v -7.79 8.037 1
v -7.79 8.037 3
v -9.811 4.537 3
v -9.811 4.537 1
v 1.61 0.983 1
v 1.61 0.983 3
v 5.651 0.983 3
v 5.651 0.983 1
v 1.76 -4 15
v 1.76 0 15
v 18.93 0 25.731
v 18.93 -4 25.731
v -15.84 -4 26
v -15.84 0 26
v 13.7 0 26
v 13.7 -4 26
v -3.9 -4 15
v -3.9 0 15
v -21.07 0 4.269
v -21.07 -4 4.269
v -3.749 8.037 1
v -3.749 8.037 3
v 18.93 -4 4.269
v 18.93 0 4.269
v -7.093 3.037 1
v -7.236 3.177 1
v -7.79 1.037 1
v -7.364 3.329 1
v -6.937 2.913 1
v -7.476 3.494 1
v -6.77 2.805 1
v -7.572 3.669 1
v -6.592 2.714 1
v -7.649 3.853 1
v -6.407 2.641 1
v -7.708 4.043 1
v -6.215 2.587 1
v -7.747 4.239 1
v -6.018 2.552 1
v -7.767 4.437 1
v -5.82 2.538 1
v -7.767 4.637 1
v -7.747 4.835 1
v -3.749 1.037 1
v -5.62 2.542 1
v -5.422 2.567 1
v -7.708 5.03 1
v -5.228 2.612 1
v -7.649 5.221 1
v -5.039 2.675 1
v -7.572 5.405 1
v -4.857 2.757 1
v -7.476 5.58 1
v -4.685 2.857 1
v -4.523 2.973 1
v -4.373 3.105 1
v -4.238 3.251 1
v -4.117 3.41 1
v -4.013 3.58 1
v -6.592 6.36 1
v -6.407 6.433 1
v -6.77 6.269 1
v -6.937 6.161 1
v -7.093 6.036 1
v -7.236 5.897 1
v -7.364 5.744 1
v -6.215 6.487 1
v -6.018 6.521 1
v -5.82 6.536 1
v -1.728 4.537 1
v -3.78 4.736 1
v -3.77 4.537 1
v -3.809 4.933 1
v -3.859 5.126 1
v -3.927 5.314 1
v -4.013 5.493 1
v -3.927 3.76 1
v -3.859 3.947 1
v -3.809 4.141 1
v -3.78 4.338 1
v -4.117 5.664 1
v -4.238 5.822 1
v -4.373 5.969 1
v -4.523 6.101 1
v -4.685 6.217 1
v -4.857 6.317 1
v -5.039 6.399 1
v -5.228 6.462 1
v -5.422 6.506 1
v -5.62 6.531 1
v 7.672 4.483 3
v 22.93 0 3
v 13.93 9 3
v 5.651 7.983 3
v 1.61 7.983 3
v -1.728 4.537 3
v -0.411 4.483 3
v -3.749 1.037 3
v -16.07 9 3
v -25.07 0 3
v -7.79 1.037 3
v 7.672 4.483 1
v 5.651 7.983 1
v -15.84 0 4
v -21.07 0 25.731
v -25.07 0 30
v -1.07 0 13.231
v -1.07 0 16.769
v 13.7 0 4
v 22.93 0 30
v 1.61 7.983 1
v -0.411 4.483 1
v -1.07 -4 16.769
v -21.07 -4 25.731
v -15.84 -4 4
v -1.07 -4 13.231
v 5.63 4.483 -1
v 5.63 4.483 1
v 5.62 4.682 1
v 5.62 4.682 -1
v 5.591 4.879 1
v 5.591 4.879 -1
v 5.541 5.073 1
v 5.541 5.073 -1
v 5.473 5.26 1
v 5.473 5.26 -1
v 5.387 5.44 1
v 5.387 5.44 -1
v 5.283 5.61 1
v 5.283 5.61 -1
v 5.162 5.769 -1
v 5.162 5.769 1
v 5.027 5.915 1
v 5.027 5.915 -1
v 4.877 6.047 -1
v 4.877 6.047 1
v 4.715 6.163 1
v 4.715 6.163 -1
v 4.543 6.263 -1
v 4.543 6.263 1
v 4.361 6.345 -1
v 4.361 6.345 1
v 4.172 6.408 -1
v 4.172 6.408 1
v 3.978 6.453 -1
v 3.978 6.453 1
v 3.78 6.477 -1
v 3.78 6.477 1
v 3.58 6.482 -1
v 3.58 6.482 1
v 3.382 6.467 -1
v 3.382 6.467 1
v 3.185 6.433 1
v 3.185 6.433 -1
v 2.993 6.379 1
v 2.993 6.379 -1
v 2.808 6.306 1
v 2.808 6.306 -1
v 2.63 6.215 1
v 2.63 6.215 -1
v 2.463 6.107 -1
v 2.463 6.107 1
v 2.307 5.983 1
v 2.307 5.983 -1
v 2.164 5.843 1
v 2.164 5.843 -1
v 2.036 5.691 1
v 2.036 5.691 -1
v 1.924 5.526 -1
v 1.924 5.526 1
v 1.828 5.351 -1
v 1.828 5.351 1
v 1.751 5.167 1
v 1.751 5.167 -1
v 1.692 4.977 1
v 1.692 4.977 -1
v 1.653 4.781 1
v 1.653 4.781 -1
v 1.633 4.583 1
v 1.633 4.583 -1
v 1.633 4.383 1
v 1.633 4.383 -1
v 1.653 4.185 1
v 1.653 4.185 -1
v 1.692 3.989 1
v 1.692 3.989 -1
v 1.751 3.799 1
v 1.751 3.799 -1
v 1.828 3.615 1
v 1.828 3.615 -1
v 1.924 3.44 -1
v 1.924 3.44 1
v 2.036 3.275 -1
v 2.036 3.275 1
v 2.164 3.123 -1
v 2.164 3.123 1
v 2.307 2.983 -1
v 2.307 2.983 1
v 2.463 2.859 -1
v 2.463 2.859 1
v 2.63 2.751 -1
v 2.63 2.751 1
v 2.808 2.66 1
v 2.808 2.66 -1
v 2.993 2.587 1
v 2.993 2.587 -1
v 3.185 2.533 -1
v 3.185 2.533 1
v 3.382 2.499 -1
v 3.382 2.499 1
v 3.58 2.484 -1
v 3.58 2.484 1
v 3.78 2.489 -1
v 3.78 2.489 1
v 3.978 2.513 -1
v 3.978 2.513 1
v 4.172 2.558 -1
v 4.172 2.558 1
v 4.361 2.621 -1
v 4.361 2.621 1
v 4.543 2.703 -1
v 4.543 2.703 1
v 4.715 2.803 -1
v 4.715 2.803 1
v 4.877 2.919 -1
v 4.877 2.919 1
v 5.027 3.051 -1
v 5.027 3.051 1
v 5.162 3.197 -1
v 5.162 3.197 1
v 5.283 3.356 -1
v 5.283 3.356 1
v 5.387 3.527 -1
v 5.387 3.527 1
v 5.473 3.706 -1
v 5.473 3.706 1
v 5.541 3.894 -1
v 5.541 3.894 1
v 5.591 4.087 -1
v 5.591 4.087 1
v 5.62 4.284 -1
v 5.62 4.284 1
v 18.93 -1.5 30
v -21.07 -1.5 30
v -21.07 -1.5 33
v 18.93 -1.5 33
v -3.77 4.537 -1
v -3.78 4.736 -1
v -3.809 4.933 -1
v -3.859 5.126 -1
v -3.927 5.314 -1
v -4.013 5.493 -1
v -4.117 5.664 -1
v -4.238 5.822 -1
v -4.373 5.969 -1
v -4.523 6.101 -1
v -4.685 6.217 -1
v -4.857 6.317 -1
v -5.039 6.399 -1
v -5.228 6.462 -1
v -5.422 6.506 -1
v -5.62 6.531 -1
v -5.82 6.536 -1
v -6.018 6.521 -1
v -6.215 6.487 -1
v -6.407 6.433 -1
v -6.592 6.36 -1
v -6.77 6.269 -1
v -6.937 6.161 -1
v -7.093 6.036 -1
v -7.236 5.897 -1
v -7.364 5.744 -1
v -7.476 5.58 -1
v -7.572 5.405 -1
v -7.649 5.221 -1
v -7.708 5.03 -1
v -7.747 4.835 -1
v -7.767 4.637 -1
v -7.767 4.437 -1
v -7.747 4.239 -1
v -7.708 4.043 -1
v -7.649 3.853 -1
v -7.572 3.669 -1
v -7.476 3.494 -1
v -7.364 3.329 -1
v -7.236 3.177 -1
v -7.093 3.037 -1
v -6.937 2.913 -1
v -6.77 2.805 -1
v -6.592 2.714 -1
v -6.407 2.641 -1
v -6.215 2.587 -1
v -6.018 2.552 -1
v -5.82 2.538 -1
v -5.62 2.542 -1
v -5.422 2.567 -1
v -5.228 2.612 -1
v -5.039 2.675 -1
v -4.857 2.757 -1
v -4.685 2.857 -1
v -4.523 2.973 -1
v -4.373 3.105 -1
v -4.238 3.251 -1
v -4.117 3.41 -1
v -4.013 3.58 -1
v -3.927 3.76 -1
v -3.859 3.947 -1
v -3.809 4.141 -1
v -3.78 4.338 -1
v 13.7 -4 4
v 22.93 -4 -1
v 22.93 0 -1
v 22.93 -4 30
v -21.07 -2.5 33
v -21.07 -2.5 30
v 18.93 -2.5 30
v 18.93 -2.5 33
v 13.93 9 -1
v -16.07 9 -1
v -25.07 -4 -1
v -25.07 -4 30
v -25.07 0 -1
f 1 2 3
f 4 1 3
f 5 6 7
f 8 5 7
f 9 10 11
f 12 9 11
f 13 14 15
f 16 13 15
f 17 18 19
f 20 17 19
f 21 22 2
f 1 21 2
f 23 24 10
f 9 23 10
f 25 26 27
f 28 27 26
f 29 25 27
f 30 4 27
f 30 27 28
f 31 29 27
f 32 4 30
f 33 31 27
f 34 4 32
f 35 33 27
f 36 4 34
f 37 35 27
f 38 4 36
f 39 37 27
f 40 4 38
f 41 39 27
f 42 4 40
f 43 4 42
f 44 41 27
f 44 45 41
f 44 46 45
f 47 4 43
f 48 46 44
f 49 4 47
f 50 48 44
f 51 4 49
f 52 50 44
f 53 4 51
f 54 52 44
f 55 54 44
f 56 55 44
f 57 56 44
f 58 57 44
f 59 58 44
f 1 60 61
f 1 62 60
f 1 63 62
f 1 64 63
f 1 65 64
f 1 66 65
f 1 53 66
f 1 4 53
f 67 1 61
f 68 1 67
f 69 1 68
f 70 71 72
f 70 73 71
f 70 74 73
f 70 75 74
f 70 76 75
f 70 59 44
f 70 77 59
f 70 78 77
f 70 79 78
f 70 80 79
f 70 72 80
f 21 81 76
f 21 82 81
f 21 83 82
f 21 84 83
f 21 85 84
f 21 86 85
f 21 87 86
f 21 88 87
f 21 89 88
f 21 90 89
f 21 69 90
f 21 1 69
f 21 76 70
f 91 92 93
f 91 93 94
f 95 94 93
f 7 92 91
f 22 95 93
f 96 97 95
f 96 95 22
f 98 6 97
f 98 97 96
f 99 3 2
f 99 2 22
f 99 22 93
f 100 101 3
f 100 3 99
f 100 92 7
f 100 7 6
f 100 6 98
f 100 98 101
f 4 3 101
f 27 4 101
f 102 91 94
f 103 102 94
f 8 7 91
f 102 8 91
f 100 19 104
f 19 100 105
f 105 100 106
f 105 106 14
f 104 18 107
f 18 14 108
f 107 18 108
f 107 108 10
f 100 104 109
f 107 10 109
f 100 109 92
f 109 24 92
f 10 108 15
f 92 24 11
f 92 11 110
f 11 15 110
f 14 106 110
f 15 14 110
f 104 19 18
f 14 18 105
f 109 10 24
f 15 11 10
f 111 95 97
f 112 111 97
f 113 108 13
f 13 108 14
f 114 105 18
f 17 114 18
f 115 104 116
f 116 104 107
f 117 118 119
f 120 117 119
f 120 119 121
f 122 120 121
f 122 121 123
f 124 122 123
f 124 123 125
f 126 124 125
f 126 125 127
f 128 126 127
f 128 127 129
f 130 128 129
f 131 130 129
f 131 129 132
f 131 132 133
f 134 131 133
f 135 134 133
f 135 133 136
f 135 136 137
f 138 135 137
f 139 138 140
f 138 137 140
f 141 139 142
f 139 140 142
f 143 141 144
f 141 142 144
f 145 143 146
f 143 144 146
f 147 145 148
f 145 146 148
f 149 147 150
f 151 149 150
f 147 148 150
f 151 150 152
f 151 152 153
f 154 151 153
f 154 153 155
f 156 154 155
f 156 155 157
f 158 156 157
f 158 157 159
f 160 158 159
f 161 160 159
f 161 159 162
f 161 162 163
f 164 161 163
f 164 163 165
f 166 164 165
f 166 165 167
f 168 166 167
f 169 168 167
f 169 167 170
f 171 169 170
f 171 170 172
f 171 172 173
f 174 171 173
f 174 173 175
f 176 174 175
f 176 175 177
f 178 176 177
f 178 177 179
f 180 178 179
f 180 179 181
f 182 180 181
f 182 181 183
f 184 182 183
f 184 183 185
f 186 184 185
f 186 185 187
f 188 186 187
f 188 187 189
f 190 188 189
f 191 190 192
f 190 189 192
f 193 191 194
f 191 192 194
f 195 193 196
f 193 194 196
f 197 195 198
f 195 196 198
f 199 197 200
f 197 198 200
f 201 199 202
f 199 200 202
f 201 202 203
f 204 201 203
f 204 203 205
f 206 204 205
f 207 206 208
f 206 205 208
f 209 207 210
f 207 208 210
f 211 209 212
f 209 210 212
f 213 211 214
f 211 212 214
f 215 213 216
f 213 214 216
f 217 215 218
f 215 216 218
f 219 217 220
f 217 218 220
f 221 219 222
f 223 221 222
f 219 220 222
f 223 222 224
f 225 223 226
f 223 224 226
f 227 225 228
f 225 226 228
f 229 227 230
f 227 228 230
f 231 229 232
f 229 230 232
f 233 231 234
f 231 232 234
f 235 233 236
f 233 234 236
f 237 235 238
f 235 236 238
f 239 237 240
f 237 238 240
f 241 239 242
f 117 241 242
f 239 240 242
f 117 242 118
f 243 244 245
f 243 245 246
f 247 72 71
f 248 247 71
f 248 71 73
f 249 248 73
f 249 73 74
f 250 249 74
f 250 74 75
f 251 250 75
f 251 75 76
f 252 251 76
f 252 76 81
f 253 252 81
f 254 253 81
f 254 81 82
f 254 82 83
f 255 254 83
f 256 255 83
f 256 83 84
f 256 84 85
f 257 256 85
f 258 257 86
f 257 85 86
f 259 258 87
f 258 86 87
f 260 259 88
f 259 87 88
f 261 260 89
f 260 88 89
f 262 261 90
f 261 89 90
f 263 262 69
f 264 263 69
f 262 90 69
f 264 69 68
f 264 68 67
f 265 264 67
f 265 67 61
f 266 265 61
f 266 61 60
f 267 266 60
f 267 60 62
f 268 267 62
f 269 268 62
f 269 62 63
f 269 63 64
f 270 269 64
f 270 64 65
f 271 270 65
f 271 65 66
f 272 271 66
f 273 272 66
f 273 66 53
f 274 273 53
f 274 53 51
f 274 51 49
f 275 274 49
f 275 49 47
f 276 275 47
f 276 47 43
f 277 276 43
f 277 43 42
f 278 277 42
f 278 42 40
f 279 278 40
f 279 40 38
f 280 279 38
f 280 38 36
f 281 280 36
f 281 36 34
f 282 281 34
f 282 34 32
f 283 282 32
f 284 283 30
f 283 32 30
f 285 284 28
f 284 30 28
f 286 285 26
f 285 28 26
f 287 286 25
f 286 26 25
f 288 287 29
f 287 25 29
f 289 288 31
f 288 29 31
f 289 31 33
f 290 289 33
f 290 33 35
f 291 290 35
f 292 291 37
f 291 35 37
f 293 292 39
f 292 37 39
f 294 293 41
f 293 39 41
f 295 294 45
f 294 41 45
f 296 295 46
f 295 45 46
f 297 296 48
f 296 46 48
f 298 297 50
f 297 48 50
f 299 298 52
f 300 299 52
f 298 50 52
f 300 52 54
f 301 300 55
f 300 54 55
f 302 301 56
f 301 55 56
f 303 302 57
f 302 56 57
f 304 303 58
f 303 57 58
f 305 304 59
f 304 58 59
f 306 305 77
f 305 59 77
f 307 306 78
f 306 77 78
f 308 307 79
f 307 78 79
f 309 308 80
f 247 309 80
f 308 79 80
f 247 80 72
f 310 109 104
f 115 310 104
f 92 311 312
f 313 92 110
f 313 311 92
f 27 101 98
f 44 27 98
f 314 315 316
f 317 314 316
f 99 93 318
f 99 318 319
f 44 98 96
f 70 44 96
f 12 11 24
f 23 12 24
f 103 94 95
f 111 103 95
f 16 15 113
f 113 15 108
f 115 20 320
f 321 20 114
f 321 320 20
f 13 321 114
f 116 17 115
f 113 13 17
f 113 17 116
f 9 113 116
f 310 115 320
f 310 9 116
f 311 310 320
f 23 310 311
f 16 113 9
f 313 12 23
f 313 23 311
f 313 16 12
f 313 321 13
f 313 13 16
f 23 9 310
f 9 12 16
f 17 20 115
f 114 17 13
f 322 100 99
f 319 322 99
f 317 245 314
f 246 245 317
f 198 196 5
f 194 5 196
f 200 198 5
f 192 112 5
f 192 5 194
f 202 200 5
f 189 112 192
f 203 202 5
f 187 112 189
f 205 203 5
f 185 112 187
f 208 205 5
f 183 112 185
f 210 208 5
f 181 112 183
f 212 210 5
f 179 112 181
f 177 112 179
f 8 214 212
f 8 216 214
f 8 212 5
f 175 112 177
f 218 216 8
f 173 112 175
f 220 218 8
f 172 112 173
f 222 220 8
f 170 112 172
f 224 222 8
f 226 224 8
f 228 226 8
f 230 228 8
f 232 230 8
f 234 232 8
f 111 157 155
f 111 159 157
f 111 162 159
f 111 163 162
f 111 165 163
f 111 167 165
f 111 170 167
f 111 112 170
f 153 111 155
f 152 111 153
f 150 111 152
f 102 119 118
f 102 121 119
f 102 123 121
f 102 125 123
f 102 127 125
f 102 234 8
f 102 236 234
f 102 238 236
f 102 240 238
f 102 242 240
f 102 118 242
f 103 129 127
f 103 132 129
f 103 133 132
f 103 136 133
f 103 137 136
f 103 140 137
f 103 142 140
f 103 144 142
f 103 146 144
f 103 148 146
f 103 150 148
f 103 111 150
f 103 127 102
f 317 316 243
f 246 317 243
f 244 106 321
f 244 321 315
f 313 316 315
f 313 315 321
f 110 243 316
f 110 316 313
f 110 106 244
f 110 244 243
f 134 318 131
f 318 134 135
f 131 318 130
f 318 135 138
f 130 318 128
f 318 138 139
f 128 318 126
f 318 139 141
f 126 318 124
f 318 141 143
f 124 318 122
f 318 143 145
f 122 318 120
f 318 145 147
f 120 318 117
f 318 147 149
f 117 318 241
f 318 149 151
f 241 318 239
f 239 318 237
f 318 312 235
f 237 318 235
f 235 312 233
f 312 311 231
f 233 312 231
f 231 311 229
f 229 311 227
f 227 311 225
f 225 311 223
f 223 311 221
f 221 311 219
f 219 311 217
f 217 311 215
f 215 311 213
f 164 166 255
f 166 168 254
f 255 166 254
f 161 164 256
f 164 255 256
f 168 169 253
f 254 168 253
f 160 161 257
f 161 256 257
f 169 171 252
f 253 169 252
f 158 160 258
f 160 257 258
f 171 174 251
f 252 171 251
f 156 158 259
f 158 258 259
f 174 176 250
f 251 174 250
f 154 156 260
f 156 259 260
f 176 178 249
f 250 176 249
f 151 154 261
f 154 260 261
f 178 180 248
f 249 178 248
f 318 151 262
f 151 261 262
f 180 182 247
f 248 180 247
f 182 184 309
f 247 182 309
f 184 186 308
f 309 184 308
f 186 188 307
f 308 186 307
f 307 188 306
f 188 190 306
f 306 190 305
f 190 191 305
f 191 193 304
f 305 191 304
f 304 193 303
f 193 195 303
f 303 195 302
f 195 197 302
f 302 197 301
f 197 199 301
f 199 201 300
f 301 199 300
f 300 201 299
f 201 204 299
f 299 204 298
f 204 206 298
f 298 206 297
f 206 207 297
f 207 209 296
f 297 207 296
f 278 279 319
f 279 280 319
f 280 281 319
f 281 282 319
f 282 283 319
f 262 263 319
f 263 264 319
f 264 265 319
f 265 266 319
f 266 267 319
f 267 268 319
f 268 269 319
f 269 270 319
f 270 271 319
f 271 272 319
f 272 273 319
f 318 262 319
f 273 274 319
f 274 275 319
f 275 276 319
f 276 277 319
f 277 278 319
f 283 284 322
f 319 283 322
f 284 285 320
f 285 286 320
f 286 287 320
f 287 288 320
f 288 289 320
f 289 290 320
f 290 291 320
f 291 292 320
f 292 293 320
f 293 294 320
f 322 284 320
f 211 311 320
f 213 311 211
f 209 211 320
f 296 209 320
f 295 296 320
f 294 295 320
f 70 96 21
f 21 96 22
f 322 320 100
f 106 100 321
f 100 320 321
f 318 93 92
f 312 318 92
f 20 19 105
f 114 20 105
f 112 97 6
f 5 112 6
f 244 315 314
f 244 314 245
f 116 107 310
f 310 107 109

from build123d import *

# Parameters (mm, degrees)
F0_W      = 48
F0_H      = 30
F1_DEPTH  = 4
F1_FACE_W = 48
F1_FACE_H = 4
F2_DEPTH  = 1
F3_W      = 40
F3_H      = 1
F4_DEPTH  = 3
F5_W      = 48
F5_H      = 4
F6_DEPTH  = 9
F7_R      = 2
F8_DEPTH  = 4
F9_DEPTH  = 2
F11_DEPTH = 4


with BuildPart() as f1:
    # F0 (on Front) → F1 (new body)
    with BuildSketch(Plane.XZ):
        with Locations((-1.069695, 15)):
            Rectangle(F0_W, F0_H)
        Polygon((-21.069695, 4.268871), (-21.069695, 25.731129), (-3.899889, 15), align=None, mode=Mode.SUBTRACT)
        Polygon((13.700111, 4), (-15.839501, 4), (-1.069695, 13.231129), align=None, mode=Mode.SUBTRACT)
        Polygon((18.930305, 25.731129), (18.930305, 4.268871), (1.760499, 15), align=None, mode=Mode.SUBTRACT)
        Polygon((-1.069695, 16.768871), (-15.839501, 26), (13.700111, 26), align=None, mode=Mode.SUBTRACT)
    extrude(amount=F1_DEPTH)

    # F1_face (on face) → F2 (join)
    with BuildSketch(Plane(origin=(-1.069695, -2, 0), x_dir=(1, 0, 0), z_dir=(0, 0, -1))):
        Rectangle(F1_FACE_W, F1_FACE_H)
    extrude(amount=F2_DEPTH)

    # F3 (on face) → F4 (join)
    with BuildSketch(Plane.XY.offset(30)):
        with Locations((-1.069695, -2)):
            Rectangle(F3_W, F3_H)
    extrude(amount=F4_DEPTH)

    # F5 (on face) → F6 (join)
    with BuildSketch(Plane(origin=(0, 0, 0), x_dir=(-1, 0, 0), z_dir=(0, 1, 0))):
        with Locations((1.069695, 1)):
            Rectangle(F5_W, F5_H)
    extrude(amount=F6_DEPTH)

    # F7 (on face) → F8 (cut)
    with BuildSketch(Plane.XY.offset(3)):
        with Locations((-5.769695, 4.536883)):
            Circle(F7_R)
        with Locations((3.630305, 4.483014)):
            Circle(F7_R)
    extrude(amount=-F8_DEPTH, mode=Mode.SUBTRACT)

    # F7 (on face) → F9 (cut)
    with BuildSketch(Plane.XY.offset(3)):
        Polygon((-3.748969, 1.036883), (-1.728243, 4.536883), (-3.748969, 8.036883), (-7.790421, 8.036883), (-9.811147, 4.536883), (-7.790421, 1.036883), align=None)
        with Locations((-5.769695, 4.536883)):
            Circle(F7_R, mode=Mode.SUBTRACT)
        Polygon((5.651031, 0.983014), (7.671757, 4.483014), (5.651031, 7.983014), (1.609579, 7.983014), (-0.411147, 4.483014), (1.609579, 0.983014), align=None)
        with Locations((3.630305, 4.483014)):
            Circle(F7_R, mode=Mode.SUBTRACT)
    extrude(amount=-F9_DEPTH, mode=Mode.SUBTRACT)

    # F10 (on face) → F11 (cut)
    with BuildSketch(Plane.XY.offset(3)):
        Polygon((-25.069695, 0), (-16.069695, 9), (-25.069695, 9), align=None)
        Polygon((22.930305, 9), (13.930305, 9), (22.930305, 0), align=None)
    extrude(amount=-F11_DEPTH, mode=Mode.SUBTRACT)


solid = f1.part
